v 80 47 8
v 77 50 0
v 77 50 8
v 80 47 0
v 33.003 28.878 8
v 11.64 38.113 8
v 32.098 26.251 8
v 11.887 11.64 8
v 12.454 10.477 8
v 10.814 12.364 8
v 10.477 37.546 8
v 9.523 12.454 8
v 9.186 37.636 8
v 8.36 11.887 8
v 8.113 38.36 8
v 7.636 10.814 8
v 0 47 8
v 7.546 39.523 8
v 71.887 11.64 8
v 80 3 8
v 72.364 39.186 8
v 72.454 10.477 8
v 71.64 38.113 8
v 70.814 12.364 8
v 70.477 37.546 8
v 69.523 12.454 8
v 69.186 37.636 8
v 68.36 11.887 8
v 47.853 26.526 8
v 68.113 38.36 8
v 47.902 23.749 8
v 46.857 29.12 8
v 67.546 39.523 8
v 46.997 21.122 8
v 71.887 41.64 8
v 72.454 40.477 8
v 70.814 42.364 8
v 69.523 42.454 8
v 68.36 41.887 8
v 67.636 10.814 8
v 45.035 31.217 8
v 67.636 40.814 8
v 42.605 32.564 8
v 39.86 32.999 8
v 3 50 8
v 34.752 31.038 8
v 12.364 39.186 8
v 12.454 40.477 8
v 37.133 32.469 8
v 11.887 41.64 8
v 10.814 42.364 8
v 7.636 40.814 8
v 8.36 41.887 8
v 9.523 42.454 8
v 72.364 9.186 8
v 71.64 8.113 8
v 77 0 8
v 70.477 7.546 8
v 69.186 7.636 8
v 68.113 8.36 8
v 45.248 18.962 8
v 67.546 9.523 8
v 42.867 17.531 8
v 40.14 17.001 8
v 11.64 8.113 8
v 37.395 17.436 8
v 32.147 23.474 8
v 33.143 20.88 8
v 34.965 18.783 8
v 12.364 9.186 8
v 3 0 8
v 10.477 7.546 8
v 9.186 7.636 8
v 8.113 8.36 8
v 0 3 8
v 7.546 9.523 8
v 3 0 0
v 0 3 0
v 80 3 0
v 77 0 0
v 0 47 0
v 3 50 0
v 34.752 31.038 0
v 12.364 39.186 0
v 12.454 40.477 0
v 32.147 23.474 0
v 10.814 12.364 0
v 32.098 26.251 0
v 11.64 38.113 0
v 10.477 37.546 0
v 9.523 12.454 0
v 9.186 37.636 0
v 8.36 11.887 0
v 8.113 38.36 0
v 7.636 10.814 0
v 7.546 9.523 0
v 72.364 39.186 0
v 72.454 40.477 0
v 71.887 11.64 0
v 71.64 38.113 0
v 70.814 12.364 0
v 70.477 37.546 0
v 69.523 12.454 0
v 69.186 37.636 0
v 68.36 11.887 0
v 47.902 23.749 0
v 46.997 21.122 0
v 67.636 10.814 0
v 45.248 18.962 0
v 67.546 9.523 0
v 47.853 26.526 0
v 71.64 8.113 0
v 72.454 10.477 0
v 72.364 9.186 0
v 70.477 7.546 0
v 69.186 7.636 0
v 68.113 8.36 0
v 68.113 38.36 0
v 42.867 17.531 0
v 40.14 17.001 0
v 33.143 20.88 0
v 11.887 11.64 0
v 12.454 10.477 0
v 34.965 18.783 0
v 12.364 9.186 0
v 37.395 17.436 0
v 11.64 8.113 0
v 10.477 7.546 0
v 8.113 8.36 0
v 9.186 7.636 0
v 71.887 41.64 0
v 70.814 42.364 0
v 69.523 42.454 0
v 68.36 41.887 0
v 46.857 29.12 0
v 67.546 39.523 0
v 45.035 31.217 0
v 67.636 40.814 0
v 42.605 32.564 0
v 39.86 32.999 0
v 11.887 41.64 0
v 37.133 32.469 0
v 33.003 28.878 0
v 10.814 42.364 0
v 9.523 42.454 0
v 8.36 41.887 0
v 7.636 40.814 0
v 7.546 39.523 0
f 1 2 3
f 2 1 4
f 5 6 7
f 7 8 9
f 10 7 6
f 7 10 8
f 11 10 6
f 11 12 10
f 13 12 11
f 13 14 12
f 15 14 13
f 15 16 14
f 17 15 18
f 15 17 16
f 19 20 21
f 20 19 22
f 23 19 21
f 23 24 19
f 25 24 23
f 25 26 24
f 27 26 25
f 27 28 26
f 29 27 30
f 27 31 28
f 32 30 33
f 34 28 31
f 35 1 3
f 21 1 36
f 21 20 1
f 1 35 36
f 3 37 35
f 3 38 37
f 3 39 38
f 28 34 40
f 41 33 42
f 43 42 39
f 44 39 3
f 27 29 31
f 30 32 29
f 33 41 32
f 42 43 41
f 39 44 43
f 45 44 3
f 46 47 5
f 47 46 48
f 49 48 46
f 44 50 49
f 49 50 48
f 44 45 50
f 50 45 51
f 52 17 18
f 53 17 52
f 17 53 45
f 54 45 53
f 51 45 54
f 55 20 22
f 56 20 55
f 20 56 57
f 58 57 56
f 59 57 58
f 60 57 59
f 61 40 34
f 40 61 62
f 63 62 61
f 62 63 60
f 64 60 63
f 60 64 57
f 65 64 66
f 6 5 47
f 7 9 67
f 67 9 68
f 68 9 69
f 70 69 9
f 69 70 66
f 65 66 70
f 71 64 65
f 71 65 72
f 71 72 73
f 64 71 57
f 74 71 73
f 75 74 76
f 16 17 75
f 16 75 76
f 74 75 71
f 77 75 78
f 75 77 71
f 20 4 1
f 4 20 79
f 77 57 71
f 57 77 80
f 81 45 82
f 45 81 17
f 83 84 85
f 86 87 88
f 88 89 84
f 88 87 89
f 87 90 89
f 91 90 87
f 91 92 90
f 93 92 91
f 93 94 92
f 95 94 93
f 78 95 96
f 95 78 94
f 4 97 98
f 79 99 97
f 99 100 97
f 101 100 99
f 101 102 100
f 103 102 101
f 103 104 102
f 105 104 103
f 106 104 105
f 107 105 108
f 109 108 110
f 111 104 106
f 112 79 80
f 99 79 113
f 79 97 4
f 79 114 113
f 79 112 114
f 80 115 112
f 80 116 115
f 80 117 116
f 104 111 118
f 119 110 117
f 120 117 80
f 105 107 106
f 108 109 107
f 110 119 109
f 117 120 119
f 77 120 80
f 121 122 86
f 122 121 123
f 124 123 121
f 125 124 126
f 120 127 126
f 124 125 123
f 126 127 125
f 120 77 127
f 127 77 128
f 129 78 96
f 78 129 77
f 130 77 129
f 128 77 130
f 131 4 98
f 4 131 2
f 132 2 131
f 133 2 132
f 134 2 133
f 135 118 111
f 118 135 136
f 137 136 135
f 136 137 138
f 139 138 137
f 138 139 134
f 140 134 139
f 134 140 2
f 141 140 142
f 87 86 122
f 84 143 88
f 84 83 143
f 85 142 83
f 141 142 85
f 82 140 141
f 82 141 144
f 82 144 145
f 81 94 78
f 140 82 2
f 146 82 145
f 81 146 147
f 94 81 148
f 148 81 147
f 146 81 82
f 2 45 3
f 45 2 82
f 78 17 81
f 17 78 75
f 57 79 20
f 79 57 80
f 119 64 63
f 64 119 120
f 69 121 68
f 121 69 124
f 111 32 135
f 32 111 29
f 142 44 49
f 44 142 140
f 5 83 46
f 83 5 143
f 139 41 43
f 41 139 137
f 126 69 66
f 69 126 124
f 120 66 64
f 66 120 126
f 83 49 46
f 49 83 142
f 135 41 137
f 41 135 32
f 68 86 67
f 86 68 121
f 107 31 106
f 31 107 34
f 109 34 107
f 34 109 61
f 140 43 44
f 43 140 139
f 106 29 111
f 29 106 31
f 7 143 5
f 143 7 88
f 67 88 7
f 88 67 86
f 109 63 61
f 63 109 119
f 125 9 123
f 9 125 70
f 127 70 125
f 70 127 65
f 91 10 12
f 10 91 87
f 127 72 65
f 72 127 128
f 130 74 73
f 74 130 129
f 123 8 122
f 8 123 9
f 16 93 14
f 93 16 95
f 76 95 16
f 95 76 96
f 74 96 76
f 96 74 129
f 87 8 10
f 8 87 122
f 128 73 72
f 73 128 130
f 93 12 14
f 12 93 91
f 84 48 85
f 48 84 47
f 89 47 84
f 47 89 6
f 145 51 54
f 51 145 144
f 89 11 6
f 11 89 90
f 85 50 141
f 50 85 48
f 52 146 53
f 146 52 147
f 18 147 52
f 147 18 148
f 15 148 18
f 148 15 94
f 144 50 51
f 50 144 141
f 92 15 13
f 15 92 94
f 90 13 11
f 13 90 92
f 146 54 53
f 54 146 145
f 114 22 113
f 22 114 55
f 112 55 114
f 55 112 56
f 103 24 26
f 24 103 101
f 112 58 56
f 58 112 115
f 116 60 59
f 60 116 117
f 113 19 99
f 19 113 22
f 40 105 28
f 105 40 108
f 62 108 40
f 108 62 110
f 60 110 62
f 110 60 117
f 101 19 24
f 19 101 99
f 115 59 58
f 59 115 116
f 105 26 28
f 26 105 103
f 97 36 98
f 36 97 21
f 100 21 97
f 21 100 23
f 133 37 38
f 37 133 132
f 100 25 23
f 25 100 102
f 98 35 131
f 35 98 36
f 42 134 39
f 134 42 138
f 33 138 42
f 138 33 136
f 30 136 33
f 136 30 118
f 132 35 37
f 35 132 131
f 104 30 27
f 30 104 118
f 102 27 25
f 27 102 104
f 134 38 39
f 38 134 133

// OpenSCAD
$fn = 32;

// ----------------------------------------------------------------------
// Spacer plate: rect 80 x 50
// ----------------------------------------------------------------------

// --- parameters (mm) ---
bore_r = 8;               // centre bore radius
bolt_r = 2.5;             // bolt hole radius
plate_t = 8;              // plate thickness, Z (extrusion height)
plate_l = 80;             // plate length, X
plate_w = 50;             // plate width, Y
inset = 10;               // corner hole inset

profile = [[3, 0], [77, 0], [80, 3], [80, 47], [77, 50], [3, 50], [0, 47], [0, 3]];  // primary outline, 8 points, counter clockwise
void_1 = [[47.853, 26.526], [46.857, 29.12], [45.035, 31.217], [42.605, 32.564], [39.86, 32.999], [37.133, 32.469], [34.752, 31.038], [33.003, 28.878], [32.098, 26.251], [32.147, 23.474], [33.143, 20.88], [34.965, 18.783], [37.395, 17.436], [40.14, 17.001], [42.867, 17.531], [45.248, 18.962], [46.997, 21.122], [47.902, 23.749]];  // centre bore, 18 points
void_2 = [[12.454, 10.477], [11.887, 11.64], [10.814, 12.364], [9.523, 12.454], [8.36, 11.887], [7.636, 10.814], [7.546, 9.523], [8.113, 8.36], [9.186, 7.636], [10.477, 7.546], [11.64, 8.113], [12.364, 9.186]];  // corner hole, 12 points
void_3 = [[12.454, 40.477], [11.887, 41.64], [10.814, 42.364], [9.523, 42.454], [8.36, 41.887], [7.636, 40.814], [7.546, 39.523], [8.113, 38.36], [9.186, 37.636], [10.477, 37.546], [11.64, 38.113], [12.364, 39.186]];  // corner hole, 12 points
void_4 = [[72.454, 10.477], [71.887, 11.64], [70.814, 12.364], [69.523, 12.454], [68.36, 11.887], [67.636, 10.814], [67.546, 9.523], [68.113, 8.36], [69.186, 7.636], [70.477, 7.546], [71.64, 8.113], [72.364, 9.186]];  // corner hole, 12 points
void_5 = [[72.454, 40.477], [71.887, 41.64], [70.814, 42.364], [69.523, 42.454], [68.36, 41.887], [67.636, 40.814], [67.546, 39.523], [68.113, 38.36], [69.186, 37.636], [70.477, 37.546], [71.64, 38.113], [72.364, 39.186]];  // corner hole, 12 points

// --- the one profile operation ---
difference() {
  linear_extrude(height = plate_t) polygon(points = profile);
  translate([0, 0, -1])
    linear_extrude(height = plate_t + 2) polygon(points = void_1);
  translate([0, 0, -1])
    linear_extrude(height = plate_t + 2) polygon(points = void_2);
  translate([0, 0, -1])
    linear_extrude(height = plate_t + 2) polygon(points = void_3);
  translate([0, 0, -1])
    linear_extrude(height = plate_t + 2) polygon(points = void_4);
  translate([0, 0, -1])
    linear_extrude(height = plate_t + 2) polygon(points = void_5);
}
